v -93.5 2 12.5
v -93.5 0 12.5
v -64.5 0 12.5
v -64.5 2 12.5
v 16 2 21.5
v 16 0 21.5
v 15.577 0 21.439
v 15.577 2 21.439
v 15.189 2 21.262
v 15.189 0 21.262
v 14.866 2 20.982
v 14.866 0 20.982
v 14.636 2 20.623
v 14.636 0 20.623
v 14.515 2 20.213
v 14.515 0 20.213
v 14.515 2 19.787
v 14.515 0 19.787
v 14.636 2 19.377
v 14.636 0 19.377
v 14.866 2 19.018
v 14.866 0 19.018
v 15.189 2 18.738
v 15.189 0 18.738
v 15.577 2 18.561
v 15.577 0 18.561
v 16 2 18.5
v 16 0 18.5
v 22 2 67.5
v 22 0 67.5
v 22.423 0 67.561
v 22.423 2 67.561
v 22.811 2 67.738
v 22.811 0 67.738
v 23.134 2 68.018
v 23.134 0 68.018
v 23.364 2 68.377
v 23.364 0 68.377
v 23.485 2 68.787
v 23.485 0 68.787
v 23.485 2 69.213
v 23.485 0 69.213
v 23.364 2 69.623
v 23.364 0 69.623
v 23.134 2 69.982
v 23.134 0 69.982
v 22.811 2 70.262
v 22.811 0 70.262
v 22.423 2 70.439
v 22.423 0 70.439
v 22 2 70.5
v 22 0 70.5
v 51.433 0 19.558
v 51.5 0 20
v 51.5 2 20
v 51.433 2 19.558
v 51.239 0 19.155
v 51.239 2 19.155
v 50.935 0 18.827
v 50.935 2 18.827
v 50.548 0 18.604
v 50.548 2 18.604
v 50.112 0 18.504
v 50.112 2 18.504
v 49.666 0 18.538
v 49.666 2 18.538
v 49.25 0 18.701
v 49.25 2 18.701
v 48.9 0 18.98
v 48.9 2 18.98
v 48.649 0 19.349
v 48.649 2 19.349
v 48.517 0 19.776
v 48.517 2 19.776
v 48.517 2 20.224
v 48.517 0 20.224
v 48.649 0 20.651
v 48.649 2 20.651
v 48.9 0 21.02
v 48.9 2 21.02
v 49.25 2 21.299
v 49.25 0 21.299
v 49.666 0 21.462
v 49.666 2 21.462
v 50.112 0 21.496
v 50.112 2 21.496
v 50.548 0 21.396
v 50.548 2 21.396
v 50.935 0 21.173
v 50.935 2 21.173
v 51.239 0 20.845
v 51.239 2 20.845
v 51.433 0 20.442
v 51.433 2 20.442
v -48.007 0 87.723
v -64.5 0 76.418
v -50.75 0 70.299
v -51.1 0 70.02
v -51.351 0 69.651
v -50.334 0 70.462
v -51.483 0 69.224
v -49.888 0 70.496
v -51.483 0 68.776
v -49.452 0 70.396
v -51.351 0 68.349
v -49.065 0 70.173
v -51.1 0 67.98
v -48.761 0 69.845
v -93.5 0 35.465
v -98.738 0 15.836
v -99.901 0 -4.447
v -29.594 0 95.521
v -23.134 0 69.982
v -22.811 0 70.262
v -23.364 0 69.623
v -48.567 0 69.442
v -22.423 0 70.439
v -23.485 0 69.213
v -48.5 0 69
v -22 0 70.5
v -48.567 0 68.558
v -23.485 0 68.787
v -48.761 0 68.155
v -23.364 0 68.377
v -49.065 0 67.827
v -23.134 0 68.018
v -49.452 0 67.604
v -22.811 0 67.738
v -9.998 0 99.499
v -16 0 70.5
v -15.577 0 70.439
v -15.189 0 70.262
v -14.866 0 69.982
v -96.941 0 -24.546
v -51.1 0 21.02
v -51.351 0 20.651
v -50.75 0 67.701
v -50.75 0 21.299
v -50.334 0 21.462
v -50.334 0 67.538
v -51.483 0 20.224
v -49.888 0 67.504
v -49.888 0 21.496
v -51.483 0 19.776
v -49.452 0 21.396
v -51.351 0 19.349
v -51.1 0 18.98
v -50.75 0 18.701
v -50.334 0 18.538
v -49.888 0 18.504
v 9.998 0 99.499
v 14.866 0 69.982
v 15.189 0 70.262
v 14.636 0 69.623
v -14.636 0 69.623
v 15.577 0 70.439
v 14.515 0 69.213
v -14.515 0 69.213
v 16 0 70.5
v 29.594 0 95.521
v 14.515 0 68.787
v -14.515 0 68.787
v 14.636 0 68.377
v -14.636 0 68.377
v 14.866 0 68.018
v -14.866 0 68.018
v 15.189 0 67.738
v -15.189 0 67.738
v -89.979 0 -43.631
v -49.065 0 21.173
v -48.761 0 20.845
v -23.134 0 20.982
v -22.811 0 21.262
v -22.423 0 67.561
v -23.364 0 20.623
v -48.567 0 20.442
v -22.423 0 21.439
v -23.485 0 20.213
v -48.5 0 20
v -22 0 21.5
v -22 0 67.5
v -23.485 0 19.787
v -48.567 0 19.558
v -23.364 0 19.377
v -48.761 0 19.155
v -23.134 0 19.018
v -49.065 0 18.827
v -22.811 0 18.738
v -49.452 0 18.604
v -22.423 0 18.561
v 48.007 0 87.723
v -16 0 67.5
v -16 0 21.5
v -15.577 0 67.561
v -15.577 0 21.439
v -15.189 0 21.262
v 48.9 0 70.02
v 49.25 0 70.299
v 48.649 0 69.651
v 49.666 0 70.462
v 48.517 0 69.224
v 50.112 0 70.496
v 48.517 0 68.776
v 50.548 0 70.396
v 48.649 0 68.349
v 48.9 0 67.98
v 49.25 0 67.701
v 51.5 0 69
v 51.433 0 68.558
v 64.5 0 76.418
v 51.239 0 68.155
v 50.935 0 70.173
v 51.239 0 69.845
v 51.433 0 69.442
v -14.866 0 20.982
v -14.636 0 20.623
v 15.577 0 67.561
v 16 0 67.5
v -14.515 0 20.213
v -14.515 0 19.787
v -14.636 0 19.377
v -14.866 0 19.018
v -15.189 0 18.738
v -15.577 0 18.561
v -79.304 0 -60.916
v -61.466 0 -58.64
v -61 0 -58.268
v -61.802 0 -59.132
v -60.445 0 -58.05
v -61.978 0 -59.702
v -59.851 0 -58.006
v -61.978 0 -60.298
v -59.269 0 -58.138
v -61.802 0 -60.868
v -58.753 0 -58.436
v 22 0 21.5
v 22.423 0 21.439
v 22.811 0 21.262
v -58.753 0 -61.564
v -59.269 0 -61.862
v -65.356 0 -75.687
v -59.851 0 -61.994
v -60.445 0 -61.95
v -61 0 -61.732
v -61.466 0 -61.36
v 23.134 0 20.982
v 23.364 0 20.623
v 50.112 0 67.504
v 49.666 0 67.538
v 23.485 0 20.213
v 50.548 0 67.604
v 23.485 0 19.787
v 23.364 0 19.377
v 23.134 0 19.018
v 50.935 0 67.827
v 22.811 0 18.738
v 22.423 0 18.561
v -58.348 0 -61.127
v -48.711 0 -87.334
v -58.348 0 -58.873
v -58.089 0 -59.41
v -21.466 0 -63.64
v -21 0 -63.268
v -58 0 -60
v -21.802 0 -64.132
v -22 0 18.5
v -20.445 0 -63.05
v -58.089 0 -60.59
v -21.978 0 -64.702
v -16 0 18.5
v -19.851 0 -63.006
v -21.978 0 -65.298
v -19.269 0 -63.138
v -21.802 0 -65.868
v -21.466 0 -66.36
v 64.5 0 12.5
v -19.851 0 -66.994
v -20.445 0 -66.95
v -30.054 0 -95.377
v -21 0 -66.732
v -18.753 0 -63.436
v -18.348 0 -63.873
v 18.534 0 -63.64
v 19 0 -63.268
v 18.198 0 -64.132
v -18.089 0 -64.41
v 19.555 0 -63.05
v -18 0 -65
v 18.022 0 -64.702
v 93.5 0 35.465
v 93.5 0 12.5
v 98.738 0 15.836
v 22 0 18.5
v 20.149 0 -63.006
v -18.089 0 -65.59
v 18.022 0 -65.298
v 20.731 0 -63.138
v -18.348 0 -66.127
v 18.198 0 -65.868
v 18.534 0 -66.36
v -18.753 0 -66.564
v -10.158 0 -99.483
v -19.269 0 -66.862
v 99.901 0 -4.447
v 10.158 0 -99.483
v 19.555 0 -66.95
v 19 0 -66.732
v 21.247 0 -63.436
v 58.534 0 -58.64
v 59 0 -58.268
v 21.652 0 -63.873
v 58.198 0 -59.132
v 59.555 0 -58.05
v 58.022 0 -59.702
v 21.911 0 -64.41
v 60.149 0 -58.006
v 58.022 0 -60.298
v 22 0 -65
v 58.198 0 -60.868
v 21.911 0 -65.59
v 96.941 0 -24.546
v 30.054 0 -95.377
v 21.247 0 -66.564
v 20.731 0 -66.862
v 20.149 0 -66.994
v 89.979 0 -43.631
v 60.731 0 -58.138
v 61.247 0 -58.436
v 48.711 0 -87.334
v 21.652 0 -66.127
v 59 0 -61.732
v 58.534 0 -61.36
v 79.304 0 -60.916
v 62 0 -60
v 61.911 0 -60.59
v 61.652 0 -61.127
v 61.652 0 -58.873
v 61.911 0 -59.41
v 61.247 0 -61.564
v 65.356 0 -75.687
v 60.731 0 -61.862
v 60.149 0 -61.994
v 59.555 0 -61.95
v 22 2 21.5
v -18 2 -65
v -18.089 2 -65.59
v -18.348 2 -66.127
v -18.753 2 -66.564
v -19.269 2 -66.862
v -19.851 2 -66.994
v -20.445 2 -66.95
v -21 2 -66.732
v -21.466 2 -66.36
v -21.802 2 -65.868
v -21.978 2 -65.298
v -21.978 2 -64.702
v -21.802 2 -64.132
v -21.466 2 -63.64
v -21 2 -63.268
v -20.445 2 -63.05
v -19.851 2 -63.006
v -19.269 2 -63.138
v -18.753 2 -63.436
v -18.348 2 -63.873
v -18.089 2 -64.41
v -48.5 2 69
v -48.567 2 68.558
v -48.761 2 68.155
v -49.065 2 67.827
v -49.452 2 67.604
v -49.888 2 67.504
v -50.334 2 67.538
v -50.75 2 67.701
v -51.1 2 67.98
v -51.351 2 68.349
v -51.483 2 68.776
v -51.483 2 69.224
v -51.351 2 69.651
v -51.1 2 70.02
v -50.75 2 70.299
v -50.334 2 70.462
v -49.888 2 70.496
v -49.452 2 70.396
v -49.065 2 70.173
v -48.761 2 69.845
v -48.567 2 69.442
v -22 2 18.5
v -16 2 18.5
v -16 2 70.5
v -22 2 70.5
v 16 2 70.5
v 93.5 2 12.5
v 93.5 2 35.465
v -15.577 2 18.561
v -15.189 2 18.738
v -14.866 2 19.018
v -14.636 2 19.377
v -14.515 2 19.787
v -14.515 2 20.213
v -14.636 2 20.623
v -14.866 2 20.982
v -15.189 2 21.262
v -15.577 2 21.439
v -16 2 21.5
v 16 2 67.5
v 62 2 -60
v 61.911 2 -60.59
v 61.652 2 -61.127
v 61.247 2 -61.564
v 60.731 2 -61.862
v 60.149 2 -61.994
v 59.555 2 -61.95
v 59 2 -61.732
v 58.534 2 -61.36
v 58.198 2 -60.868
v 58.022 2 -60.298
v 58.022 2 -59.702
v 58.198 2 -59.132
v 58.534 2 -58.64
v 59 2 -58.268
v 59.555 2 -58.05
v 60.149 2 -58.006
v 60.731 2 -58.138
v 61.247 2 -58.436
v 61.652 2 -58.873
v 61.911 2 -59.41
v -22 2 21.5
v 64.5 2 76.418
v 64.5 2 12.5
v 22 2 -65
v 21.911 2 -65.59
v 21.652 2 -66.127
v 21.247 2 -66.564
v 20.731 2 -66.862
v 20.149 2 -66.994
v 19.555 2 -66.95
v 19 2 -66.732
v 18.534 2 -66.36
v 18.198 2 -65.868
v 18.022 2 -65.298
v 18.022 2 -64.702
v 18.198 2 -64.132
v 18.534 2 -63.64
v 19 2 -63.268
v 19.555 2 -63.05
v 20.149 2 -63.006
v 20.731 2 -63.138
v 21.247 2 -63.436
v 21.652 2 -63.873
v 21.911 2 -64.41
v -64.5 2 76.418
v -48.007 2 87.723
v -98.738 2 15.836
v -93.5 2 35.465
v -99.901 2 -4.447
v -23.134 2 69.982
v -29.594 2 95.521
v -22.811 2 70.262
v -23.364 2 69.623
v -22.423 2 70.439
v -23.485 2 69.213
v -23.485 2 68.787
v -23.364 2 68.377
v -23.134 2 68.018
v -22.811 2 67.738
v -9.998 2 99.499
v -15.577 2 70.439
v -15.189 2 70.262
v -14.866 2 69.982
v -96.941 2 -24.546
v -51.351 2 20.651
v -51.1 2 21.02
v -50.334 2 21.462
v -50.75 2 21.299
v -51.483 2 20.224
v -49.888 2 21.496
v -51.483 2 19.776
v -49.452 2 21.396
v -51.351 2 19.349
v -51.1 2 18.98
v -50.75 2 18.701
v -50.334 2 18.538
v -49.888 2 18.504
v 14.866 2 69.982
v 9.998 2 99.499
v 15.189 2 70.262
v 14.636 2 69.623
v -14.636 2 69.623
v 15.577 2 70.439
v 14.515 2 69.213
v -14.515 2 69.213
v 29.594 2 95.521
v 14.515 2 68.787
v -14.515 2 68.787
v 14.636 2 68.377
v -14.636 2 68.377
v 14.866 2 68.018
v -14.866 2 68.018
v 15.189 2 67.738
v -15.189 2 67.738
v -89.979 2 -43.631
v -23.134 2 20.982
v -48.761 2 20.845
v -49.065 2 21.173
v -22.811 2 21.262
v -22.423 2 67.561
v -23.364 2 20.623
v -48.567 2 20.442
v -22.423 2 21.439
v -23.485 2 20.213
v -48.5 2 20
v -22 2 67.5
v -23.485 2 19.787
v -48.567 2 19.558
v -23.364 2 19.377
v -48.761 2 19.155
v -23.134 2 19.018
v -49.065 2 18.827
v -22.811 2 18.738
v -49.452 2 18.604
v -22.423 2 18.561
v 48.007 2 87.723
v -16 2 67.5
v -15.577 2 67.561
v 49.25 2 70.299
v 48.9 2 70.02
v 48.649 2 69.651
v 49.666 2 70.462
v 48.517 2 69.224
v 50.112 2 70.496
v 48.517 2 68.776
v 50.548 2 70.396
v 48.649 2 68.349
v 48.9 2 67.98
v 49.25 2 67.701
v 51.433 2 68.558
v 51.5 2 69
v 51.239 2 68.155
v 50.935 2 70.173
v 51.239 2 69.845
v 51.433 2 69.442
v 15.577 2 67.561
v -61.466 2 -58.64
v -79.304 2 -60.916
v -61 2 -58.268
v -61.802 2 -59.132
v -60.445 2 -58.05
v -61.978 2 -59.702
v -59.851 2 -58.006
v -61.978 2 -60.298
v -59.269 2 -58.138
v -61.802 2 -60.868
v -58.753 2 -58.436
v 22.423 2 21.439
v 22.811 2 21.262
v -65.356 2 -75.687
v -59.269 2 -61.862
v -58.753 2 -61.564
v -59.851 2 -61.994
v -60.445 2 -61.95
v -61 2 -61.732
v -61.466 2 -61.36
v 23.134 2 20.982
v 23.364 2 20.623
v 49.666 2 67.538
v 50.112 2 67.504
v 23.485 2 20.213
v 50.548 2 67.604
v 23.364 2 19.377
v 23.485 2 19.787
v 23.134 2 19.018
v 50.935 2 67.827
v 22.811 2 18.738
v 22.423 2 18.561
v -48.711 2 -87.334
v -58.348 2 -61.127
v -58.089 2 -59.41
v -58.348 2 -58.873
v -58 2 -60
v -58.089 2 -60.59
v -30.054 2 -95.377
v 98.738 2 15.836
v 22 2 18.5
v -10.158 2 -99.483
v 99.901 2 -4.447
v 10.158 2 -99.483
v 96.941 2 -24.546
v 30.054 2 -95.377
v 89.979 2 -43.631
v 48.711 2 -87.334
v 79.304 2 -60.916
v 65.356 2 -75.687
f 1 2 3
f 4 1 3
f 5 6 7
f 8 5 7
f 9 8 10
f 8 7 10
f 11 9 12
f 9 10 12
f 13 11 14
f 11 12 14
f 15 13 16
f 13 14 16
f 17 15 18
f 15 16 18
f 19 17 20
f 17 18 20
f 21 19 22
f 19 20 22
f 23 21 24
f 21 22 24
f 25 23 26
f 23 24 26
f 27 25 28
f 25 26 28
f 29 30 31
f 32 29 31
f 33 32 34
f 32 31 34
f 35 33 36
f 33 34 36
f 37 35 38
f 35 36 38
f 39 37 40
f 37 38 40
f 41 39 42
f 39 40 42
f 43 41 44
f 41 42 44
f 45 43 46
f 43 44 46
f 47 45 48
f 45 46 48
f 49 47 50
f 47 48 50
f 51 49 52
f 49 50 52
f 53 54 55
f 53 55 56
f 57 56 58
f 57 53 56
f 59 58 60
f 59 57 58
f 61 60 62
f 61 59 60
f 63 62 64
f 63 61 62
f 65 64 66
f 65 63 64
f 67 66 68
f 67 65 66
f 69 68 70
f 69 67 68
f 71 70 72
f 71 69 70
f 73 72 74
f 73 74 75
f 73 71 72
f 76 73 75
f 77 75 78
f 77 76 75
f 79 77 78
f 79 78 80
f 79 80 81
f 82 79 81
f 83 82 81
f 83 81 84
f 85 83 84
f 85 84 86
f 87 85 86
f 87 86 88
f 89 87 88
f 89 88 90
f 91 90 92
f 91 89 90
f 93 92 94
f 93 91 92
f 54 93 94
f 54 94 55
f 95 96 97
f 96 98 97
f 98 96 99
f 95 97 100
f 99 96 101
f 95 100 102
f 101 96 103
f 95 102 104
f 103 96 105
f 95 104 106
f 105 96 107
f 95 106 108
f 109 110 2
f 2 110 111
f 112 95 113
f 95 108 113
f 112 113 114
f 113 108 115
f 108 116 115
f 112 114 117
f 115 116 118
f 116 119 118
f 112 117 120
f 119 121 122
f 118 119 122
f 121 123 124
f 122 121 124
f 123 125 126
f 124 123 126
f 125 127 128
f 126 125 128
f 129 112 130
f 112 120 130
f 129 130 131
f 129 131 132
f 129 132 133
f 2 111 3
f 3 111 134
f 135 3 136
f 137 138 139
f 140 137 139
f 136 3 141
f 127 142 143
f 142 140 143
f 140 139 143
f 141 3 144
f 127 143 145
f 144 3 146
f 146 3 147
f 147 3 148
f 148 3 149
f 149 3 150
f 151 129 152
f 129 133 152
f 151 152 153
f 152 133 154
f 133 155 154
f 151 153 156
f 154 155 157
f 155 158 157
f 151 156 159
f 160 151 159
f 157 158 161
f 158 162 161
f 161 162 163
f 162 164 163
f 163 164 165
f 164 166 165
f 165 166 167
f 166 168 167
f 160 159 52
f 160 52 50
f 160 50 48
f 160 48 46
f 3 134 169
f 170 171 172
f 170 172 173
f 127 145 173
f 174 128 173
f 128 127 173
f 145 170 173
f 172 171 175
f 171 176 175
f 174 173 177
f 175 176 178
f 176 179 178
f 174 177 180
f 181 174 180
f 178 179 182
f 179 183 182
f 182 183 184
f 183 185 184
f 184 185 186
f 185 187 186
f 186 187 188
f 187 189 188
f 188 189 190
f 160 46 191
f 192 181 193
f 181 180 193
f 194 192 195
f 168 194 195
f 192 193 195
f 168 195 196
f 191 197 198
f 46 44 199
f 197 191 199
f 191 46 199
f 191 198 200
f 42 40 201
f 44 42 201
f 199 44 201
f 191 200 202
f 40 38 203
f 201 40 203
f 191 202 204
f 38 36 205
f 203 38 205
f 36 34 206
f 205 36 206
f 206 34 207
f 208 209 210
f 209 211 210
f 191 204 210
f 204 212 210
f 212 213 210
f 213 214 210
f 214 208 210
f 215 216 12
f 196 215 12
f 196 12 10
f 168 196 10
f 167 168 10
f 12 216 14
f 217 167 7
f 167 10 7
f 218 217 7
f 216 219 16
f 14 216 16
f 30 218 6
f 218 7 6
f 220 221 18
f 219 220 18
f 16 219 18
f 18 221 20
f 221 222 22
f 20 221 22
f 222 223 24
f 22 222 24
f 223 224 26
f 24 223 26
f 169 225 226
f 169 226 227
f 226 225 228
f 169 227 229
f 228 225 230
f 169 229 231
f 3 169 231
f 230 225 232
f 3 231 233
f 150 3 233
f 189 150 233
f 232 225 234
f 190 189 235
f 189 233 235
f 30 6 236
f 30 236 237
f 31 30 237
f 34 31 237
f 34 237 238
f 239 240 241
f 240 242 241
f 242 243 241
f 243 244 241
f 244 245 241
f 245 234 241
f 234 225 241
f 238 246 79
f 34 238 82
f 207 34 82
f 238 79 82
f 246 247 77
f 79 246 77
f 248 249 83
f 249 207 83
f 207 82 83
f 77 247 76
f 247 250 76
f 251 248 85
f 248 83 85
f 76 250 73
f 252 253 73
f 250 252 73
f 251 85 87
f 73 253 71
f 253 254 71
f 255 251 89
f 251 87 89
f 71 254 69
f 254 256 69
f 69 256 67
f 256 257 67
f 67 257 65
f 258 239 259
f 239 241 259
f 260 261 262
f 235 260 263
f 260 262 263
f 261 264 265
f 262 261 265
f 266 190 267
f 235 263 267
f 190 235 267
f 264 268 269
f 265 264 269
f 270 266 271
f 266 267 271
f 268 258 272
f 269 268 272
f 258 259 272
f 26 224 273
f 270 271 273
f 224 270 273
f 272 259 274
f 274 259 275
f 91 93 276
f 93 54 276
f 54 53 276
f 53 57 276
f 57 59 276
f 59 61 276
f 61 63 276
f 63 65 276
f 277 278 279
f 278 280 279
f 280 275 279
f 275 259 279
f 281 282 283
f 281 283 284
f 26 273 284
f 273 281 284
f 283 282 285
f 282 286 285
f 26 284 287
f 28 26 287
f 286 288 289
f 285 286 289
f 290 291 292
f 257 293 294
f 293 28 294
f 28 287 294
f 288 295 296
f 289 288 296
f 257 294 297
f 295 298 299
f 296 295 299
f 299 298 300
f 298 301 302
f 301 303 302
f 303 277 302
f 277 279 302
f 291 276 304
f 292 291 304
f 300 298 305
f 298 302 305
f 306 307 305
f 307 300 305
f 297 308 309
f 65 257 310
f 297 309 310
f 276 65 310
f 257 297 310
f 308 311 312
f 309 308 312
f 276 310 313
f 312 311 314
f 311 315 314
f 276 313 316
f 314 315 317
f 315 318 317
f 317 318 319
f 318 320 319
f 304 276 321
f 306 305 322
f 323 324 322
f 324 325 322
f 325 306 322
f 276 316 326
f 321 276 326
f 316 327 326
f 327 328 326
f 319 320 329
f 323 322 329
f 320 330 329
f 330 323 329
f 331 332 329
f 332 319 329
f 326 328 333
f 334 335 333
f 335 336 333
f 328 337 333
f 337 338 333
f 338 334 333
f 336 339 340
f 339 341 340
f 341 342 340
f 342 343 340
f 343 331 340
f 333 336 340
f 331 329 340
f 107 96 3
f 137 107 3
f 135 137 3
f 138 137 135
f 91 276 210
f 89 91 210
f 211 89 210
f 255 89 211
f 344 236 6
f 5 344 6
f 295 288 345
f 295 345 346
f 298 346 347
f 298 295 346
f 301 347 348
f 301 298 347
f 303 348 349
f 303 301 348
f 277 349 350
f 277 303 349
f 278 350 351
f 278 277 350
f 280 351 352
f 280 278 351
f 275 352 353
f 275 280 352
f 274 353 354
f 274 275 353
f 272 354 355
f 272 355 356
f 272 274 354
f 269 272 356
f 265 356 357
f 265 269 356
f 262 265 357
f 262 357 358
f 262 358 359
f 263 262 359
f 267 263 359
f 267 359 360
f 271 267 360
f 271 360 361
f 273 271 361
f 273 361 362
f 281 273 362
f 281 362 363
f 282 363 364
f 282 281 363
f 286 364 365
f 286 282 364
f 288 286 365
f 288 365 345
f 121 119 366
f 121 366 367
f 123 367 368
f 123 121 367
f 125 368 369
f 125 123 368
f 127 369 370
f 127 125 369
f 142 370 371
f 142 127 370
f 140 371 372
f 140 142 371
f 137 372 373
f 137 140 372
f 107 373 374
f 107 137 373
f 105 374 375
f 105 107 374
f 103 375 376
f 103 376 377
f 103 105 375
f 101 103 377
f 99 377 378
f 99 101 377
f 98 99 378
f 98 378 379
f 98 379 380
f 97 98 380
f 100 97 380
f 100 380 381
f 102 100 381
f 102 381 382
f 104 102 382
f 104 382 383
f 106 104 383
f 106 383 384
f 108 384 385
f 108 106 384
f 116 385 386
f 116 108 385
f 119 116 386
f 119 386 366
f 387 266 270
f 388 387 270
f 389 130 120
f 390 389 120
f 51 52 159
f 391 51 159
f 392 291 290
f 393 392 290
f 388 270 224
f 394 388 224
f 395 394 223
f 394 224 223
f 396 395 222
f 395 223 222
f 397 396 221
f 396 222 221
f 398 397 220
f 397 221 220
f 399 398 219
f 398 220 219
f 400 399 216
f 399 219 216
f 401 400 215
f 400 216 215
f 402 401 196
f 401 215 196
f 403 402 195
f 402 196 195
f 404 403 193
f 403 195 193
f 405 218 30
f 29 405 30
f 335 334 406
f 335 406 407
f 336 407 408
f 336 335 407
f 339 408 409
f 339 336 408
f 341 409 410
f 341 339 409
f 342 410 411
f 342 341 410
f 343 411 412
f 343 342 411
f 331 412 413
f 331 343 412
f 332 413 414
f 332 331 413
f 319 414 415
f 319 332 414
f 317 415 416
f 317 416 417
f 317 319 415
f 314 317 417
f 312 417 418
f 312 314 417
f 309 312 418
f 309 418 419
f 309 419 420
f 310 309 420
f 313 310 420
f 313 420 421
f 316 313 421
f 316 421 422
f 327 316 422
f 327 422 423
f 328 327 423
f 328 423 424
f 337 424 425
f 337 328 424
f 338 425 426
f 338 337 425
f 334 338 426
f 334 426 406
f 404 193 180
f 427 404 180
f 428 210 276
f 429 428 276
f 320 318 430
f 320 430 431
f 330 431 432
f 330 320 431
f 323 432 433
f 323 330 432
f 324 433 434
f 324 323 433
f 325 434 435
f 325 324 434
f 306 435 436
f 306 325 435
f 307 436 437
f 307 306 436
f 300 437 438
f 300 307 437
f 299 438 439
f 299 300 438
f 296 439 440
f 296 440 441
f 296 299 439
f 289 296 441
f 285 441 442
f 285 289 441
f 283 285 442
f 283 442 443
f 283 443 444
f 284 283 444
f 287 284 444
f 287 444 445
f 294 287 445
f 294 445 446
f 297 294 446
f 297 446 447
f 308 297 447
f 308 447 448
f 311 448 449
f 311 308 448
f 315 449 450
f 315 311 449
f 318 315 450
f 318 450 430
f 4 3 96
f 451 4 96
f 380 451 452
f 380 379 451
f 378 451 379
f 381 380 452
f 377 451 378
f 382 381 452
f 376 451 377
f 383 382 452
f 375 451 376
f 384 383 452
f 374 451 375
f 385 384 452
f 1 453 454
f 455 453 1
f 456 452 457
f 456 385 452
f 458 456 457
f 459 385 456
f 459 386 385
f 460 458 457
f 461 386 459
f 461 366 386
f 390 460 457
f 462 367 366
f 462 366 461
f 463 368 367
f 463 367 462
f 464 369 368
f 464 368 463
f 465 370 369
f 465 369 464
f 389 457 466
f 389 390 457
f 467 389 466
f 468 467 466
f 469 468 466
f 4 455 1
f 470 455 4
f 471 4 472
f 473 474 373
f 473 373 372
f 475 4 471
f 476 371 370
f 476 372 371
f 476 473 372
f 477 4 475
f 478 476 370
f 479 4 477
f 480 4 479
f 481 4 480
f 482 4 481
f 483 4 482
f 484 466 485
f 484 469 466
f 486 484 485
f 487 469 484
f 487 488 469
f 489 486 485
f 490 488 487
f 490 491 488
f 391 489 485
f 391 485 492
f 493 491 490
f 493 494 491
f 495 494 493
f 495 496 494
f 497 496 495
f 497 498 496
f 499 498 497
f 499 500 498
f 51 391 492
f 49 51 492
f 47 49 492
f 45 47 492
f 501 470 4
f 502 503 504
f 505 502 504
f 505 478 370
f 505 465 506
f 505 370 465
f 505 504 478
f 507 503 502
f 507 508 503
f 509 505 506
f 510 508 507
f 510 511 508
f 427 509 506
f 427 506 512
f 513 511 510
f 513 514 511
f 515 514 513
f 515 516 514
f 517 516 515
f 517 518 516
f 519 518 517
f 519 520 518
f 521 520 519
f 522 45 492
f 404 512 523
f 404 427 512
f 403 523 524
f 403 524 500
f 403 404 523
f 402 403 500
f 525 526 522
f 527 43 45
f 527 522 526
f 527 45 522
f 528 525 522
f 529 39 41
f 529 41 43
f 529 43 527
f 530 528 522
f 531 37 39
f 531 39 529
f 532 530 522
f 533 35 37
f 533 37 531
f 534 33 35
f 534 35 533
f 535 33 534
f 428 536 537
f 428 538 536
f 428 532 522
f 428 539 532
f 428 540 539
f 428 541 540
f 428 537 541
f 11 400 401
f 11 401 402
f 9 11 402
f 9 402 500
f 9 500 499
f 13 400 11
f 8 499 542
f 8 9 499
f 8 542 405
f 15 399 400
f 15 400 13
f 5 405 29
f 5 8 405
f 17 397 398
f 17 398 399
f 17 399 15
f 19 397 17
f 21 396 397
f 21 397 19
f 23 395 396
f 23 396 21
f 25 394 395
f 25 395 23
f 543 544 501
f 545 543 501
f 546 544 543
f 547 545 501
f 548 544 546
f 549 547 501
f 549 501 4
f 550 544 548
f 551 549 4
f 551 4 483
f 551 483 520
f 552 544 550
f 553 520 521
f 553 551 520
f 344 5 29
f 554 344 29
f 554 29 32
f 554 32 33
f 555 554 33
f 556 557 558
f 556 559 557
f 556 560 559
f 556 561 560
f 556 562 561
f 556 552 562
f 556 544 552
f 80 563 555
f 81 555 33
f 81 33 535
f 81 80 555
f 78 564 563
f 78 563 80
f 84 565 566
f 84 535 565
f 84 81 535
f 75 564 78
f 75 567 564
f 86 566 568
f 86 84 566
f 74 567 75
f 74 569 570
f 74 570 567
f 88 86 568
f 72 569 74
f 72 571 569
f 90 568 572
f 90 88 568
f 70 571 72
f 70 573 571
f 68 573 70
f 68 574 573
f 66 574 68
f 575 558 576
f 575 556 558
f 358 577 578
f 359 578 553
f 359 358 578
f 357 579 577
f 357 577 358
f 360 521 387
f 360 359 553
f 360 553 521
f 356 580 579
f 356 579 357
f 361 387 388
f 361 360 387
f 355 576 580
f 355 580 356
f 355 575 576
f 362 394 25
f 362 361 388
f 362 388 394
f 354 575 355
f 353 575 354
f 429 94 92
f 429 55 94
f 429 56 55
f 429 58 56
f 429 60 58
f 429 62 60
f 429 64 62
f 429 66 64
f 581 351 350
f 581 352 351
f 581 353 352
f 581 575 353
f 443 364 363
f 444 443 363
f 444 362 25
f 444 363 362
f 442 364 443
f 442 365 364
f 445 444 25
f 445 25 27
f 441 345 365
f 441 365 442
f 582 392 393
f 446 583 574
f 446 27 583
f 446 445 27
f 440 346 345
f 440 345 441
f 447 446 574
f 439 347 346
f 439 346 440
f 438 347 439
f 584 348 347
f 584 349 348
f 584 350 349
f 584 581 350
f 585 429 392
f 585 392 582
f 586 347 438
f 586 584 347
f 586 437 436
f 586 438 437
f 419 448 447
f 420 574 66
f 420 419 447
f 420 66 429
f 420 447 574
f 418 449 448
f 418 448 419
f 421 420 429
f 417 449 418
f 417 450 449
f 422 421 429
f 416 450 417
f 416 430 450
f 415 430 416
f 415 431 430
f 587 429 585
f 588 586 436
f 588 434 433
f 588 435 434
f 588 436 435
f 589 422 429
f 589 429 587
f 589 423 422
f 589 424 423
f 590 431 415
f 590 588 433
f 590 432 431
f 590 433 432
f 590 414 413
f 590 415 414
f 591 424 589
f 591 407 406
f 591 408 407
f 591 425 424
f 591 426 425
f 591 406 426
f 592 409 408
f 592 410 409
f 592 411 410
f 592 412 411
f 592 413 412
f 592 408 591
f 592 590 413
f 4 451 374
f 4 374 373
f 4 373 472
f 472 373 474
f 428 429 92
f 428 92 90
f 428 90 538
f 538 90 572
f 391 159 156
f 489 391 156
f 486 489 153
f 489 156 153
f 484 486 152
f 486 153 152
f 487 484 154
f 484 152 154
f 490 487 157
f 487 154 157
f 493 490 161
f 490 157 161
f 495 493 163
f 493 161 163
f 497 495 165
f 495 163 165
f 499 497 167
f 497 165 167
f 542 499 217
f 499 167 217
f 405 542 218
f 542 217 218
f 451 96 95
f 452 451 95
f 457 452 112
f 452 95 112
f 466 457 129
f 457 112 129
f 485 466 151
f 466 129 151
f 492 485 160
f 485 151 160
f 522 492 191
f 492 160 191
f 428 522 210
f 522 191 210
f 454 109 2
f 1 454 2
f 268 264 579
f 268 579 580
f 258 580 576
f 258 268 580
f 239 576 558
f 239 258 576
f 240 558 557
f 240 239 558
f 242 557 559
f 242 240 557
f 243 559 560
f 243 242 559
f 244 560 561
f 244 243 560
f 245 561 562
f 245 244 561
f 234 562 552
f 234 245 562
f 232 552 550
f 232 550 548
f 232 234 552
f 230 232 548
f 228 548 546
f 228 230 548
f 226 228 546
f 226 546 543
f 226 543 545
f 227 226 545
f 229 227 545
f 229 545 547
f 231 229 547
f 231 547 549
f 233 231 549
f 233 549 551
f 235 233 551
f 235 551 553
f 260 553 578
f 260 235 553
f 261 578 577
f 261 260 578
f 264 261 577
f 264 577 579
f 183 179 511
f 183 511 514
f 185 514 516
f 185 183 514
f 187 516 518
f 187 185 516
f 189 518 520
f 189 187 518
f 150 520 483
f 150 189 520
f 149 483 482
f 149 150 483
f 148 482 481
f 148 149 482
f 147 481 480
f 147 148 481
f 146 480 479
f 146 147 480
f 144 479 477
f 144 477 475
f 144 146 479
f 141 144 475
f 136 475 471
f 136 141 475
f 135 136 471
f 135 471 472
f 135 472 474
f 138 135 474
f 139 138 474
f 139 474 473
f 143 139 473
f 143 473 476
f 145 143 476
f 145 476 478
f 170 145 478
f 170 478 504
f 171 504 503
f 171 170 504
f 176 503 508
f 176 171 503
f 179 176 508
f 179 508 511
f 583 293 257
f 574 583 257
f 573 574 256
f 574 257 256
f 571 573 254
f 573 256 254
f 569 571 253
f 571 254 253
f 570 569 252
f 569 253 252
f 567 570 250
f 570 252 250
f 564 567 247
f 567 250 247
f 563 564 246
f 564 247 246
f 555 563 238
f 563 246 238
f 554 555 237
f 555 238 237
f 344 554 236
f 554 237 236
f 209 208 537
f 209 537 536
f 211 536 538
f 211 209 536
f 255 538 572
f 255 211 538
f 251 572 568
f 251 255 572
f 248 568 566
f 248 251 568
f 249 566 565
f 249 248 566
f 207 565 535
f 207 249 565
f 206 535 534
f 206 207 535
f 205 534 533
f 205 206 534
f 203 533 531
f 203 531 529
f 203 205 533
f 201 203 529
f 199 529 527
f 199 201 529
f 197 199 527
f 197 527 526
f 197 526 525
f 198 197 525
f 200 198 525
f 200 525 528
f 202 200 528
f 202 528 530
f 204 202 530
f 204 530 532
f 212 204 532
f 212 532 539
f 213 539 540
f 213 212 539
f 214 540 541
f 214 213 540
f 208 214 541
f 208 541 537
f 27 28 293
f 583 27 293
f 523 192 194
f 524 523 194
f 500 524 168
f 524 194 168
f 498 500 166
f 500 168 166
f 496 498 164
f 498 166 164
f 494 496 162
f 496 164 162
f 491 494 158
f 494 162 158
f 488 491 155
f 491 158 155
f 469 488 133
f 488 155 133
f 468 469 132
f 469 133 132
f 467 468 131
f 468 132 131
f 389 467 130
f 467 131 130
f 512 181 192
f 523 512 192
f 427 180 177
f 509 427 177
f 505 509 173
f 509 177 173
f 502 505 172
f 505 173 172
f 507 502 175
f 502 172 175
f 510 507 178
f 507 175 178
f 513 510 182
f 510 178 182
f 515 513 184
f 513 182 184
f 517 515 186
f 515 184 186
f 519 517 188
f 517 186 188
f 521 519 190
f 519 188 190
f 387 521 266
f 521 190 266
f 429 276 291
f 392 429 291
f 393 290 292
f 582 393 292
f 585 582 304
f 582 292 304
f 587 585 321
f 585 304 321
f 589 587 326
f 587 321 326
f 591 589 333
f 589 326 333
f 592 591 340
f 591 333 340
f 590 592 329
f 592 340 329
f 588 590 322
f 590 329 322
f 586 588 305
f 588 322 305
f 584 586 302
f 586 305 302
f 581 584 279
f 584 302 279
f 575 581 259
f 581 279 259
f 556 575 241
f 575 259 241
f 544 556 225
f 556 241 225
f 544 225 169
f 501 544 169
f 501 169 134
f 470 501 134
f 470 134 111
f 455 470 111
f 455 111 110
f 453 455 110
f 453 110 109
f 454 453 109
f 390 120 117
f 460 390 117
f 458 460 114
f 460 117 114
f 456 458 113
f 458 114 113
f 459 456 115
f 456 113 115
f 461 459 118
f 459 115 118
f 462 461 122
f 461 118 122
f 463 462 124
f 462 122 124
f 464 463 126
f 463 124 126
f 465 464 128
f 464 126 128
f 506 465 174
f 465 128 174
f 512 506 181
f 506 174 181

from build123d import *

# Parameters (mm, degrees)
SKETCH1_R           = 1.5
SKETCH1_R_2         = 2
BOSS_EXTRUDE1_DEPTH = 2


with BuildPart() as part:
    # Sketch1 → Boss-Extrude1 (new body)
    with BuildSketch(Plane(origin=(0, 0, 0), x_dir=(1, 0, 0), z_dir=(0, 1, 0))):
        with BuildLine():
            Line((-93.5, -35.464771253), (-93.5, -12.5))
            Line((-93.5, -12.5), (-64.5, -12.5))
            Line((-64.5, -12.5), (-64.5, -76.418256981))
            ThreePointArc((-64.5, -76.418256981), (0, -100), (64.5, -76.418256981))
            Line((64.5, -76.418256981), (64.5, -12.5))
            Line((64.5, -12.5), (93.5, -12.5))
            Line((93.5, -12.5), (93.5, -35.464771253))
            ThreePointArc((93.5, -35.464771253), (0, 100), (-93.5, -35.464771253))
        make_face()
        with Locations((-50, -69)):
            Circle(SKETCH1_R, mode=Mode.SUBTRACT)
        with BuildLine():
            Line((-22, -67.5), (-16, -67.5))
            ThreePointArc((-16, -67.5), (-14.5, -69), (-16, -70.5))
            Line((-16, -70.5), (-22, -70.5))
            ThreePointArc((-22, -70.5), (-23.5, -69), (-22, -67.5))
        make_face(mode=Mode.SUBTRACT)
        with Locations((-50, -20)):
            Circle(SKETCH1_R, mode=Mode.SUBTRACT)
        with BuildLine():
            ThreePointArc((-16, -18.5), (-14.5, -20), (-16, -21.5))
            Line((-16, -21.5), (-22, -21.5))
            ThreePointArc((-22, -21.5), (-23.5, -20), (-22, -18.5))
            Line((-22, -18.5), (-16, -18.5))
        make_face(mode=Mode.SUBTRACT)
        with BuildLine():
            ThreePointArc((16, -70.5), (14.5, -69), (16, -67.5))
            Line((16, -67.5), (22, -67.5))
            ThreePointArc((22, -67.5), (23.5, -69), (22, -70.5))
            Line((22, -70.5), (16, -70.5))
        make_face(mode=Mode.SUBTRACT)
        with Locations((50, -69)):
            Circle(SKETCH1_R, mode=Mode.SUBTRACT)
        with BuildLine():
            Line((22, -21.5), (16, -21.5))
            ThreePointArc((16, -21.5), (14.5, -20), (16, -18.5))
            Line((16, -18.5), (22, -18.5))
            ThreePointArc((22, -18.5), (23.5, -20), (22, -21.5))
        make_face(mode=Mode.SUBTRACT)
        with Locations((50, -20)):
            Circle(SKETCH1_R, mode=Mode.SUBTRACT)
        with Locations((-60, 60)):
            Circle(SKETCH1_R_2, mode=Mode.SUBTRACT)
        with Locations((-20, 65)):
            Circle(SKETCH1_R_2, mode=Mode.SUBTRACT)
        with Locations((20, 65)):
            Circle(SKETCH1_R_2, mode=Mode.SUBTRACT)
        with Locations((60, 60)):
            Circle(SKETCH1_R_2, mode=Mode.SUBTRACT)
    extrude(amount=BOSS_EXTRUDE1_DEPTH)


solid = part.part
